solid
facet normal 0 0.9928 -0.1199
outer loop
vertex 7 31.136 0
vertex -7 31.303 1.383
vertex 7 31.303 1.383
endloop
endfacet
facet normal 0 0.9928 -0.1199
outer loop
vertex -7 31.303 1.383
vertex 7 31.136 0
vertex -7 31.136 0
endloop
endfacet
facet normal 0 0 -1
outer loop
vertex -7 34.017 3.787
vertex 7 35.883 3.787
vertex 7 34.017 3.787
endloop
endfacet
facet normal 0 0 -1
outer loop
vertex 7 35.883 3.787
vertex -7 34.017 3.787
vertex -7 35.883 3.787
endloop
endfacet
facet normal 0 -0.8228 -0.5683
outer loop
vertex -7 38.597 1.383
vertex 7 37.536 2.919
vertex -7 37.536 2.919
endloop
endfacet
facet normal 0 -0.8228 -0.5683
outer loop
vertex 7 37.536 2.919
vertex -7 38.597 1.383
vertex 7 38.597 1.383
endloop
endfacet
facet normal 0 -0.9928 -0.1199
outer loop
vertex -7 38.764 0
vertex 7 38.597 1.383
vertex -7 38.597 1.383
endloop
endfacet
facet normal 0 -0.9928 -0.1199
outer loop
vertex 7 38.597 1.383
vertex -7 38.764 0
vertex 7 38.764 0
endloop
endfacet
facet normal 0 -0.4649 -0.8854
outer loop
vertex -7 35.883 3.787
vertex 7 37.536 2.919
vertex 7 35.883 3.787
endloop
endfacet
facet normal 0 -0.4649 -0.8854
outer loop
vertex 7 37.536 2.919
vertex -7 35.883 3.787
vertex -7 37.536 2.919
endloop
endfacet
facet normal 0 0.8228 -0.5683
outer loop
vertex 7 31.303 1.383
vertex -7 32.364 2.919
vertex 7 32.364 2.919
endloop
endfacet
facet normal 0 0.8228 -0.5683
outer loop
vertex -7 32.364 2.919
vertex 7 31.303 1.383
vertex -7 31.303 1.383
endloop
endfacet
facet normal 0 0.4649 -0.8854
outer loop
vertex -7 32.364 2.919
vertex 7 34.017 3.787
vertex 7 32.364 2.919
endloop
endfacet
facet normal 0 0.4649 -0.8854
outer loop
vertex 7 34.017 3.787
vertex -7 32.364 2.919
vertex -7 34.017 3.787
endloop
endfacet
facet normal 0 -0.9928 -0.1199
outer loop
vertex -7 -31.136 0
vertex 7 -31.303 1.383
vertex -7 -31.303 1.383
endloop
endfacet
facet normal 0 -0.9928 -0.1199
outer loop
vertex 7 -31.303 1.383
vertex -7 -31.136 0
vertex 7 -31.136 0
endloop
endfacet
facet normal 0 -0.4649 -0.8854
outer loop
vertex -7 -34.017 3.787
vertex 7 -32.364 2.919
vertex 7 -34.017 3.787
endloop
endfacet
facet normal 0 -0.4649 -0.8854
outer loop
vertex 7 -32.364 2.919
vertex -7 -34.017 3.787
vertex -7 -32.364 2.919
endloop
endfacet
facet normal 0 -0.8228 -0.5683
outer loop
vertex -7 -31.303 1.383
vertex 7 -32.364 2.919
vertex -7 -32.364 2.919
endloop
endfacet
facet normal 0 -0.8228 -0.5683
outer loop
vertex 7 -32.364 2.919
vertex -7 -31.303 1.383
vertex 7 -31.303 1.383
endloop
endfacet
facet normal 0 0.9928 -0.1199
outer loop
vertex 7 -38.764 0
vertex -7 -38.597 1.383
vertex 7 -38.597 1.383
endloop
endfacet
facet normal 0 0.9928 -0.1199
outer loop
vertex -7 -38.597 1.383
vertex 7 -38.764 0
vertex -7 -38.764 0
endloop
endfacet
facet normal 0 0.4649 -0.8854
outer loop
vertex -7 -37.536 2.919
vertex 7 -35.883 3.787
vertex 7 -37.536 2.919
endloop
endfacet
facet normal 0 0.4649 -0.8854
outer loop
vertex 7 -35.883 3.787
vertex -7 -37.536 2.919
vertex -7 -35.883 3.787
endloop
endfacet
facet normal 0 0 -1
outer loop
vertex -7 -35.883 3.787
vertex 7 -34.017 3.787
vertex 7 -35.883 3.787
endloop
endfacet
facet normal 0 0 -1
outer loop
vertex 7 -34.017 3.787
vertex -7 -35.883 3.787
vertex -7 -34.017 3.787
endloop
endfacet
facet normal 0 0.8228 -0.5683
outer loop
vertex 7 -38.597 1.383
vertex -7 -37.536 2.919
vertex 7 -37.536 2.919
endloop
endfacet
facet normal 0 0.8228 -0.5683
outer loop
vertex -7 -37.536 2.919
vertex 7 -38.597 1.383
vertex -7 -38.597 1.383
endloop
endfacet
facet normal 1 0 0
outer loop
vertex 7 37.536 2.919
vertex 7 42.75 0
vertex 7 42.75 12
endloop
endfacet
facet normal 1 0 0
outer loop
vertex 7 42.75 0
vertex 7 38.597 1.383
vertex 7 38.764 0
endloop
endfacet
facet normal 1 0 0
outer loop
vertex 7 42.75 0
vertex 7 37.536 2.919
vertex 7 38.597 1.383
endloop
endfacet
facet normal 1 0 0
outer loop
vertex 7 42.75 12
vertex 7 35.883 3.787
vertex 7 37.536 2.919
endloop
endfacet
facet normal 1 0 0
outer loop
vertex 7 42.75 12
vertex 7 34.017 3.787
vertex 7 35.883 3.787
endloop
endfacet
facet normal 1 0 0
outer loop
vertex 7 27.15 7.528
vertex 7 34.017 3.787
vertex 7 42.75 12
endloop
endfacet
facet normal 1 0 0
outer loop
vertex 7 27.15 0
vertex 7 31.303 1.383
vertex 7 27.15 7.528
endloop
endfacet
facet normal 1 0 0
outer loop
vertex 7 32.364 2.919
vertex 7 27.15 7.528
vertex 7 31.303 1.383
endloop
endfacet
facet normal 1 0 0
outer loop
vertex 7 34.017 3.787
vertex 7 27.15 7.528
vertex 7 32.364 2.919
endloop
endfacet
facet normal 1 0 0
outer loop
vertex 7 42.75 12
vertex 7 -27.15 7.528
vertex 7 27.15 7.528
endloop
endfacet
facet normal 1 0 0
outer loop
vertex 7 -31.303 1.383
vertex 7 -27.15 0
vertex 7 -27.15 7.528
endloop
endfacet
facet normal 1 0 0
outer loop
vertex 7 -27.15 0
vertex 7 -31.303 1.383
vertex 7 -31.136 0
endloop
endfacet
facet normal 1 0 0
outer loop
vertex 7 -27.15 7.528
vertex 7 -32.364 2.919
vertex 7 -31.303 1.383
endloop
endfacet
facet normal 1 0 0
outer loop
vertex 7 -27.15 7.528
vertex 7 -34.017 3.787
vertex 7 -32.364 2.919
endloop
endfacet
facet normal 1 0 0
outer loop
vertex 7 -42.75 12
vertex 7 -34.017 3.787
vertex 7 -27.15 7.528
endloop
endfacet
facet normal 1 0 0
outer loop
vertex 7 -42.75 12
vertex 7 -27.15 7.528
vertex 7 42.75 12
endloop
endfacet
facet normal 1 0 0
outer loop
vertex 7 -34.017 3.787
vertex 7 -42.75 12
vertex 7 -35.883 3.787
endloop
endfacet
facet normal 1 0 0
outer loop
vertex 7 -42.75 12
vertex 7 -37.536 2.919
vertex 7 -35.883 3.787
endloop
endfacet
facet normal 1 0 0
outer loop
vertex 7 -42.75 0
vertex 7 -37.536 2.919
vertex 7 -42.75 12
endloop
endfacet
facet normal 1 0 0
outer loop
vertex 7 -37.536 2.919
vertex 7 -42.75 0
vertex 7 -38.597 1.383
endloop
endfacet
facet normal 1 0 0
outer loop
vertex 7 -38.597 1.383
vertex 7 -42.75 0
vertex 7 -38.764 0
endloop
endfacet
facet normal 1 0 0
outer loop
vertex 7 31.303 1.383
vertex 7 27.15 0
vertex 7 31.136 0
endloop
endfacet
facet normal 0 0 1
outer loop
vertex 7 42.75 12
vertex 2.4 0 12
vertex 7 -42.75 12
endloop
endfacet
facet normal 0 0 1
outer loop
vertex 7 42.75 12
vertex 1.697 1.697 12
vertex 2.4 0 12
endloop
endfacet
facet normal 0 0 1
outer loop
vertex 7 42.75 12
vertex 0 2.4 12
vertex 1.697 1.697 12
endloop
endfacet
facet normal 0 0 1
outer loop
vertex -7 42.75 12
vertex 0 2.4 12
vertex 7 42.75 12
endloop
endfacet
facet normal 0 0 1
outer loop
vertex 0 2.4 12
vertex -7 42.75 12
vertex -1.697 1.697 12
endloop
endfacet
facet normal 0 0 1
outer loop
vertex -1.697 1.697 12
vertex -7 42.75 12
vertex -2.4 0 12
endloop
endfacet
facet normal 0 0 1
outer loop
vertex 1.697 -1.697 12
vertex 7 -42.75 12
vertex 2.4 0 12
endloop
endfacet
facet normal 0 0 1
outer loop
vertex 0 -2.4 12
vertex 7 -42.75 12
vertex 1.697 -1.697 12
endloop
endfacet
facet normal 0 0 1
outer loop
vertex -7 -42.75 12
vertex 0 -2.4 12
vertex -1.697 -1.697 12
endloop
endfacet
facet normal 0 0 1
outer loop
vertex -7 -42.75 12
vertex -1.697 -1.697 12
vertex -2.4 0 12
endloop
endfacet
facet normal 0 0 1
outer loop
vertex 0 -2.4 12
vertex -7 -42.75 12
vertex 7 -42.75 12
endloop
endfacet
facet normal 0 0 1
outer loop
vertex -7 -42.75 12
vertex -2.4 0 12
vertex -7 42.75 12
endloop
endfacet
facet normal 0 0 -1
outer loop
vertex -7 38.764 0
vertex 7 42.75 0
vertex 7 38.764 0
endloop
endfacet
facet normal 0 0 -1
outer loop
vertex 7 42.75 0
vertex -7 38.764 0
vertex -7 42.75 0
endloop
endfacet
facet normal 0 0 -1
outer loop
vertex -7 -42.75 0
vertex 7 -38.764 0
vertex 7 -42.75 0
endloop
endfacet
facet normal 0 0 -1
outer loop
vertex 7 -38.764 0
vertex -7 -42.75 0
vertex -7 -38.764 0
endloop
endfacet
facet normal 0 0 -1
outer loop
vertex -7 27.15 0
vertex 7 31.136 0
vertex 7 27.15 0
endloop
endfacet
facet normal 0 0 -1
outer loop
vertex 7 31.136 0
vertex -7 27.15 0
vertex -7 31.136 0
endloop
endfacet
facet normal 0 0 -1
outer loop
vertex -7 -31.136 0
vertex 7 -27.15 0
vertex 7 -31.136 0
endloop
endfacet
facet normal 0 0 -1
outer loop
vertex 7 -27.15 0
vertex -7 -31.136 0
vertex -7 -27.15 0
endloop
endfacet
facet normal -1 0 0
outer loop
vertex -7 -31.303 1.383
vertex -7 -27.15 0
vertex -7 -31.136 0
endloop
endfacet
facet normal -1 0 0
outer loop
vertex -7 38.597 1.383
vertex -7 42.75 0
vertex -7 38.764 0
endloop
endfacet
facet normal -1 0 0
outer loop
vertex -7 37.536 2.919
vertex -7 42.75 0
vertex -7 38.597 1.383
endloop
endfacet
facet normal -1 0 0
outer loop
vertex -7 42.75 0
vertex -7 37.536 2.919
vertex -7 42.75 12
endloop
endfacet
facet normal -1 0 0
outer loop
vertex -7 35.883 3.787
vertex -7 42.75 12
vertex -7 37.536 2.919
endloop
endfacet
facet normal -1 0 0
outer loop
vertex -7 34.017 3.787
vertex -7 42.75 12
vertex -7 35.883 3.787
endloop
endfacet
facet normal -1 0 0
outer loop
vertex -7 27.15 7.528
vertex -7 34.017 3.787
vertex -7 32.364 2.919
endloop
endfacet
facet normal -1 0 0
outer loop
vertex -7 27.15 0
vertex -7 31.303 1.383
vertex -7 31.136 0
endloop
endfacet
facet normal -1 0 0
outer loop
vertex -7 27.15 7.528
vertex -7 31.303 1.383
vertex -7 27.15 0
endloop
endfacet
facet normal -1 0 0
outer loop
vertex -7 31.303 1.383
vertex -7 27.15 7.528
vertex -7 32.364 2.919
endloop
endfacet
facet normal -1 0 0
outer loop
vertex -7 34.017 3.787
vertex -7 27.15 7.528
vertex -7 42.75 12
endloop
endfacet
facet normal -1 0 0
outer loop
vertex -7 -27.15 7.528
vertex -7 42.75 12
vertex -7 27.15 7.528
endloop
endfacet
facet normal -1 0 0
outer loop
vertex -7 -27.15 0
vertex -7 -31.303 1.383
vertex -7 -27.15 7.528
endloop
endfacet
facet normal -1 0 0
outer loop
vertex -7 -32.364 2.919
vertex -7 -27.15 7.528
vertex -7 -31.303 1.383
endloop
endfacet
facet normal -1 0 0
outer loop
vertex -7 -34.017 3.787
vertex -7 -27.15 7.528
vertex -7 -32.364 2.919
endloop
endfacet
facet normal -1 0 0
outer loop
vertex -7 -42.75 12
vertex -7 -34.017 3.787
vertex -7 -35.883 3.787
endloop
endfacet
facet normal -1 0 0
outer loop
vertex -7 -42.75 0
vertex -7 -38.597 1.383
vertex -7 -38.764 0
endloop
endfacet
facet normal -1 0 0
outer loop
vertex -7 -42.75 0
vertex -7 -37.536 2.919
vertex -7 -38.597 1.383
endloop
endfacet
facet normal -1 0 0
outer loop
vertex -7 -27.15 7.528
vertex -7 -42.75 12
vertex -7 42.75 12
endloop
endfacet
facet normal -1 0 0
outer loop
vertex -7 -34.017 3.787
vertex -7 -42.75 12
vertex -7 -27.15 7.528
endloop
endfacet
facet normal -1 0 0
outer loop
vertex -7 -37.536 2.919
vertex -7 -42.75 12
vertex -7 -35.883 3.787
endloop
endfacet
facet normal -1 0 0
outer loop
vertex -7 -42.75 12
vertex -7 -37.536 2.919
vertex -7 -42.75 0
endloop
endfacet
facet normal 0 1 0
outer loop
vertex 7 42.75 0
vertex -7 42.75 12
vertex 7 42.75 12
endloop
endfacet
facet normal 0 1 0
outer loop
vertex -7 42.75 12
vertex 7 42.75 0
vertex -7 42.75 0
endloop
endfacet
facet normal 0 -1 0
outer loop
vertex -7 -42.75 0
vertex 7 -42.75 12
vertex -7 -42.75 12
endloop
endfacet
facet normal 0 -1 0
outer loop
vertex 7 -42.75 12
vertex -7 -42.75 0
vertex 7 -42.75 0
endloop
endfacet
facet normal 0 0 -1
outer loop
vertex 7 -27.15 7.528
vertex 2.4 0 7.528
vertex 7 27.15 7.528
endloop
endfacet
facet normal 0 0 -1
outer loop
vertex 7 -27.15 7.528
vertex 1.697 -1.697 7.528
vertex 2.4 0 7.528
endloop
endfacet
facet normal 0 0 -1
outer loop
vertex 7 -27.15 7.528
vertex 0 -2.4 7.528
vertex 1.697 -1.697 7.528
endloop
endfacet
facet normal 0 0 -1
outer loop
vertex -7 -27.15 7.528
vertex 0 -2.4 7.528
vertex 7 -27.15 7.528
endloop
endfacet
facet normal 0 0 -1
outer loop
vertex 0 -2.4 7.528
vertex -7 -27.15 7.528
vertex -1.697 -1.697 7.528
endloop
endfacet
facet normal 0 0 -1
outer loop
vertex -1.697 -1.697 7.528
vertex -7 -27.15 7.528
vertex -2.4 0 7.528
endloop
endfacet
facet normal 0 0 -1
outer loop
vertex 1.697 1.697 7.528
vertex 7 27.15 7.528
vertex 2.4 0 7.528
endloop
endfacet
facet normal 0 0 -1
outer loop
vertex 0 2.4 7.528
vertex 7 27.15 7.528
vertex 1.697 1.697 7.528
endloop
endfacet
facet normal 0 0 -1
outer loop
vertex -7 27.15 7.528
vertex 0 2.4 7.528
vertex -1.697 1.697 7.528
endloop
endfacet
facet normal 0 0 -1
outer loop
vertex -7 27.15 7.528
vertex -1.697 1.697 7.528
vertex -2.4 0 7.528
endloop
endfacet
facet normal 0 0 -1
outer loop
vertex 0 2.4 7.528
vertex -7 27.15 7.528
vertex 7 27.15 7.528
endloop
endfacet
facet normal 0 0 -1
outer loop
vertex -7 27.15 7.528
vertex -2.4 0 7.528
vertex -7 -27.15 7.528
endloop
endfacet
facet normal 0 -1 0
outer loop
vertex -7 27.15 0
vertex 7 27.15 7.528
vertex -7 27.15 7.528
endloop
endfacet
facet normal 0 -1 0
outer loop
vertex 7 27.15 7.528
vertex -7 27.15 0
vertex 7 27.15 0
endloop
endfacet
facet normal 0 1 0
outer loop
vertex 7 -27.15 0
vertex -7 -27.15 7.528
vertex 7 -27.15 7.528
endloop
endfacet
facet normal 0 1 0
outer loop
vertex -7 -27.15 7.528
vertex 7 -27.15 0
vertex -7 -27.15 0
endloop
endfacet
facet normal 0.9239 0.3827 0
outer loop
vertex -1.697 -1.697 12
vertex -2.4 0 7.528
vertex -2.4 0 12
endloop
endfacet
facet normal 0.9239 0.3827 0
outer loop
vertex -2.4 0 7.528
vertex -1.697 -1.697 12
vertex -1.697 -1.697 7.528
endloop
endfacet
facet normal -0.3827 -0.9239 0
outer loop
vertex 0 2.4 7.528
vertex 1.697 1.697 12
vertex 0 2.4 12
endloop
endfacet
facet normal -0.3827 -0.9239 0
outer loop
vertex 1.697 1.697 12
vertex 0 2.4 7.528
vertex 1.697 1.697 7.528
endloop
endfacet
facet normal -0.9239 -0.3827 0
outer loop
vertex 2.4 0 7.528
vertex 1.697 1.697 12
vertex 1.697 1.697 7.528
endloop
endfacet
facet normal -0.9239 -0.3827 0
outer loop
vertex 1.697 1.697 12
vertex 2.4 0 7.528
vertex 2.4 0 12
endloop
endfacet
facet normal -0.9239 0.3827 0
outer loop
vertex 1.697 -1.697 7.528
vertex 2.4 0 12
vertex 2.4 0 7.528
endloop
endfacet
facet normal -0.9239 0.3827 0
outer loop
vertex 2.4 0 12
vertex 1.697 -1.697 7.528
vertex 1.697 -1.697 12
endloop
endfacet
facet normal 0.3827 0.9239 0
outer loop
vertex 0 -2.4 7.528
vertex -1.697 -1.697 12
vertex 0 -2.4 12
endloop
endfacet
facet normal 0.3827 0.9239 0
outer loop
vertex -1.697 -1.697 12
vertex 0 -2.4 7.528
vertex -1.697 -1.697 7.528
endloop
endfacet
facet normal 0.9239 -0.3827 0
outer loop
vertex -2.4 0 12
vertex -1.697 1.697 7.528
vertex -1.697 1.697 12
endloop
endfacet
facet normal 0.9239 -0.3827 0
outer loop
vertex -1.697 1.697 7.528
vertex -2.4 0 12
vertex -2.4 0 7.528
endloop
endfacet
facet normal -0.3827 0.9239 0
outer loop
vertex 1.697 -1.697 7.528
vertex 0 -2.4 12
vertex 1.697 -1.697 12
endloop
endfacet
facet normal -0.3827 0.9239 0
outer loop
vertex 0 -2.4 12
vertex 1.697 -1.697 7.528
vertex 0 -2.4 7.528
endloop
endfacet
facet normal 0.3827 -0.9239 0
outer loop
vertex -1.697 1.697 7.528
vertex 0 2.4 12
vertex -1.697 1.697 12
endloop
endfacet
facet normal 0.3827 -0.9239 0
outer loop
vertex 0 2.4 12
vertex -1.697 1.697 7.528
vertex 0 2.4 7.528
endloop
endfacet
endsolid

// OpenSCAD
//Stand for Depth Guage
//Ari M. Diacou
//Created Jan 16, 2016
//Shared under Creative Commons License: Attribution-ShareAlike 3.0 Unported (CC BY-SA 3.0) 
//see http://creativecommons.org/licenses/by-sa/3.0/


//Measure the widest part of the base of your depth guage.
depth_guage_width = 52.8;
//Measure the base of your depth guage in a direction perpendicular to the distance measured above.
depth_guage_length = 7;
//How much could the depth guage be recessed into the block (and still lie flat)?
depth_guage_depth = 4.2;
//By what height does the bridge have to clear the belt above the top of the rails?
clearance=3.4;
//How high should this block be?
block_height = 12;
//What is the diameter of your depth guage pin (plus a tolerance)?
hole_diameter = 4.8;
//Measure the distance between your rails.
inner_rail_distance = 62.1;
//Measure the distance between the outsides of your rails.
outer_rail_distance = 77.7;

// preview[view:south east, tilt:top]

/* [Hidden] */
//////////////// Derived Parameters ////////////////////////
rail_diameter=(outer_rail_distance-inner_rail_distance)/2;
ep=0+0.05; //epsilon, a small number, used for overlaps
block=[depth_guage_length*2, outer_rail_distance+rail_diameter, block_height];
inner_height=rms([block_height,clearance+depth_guage_depth+rail_diameter/2,clearance+depth_guage_length/2+rail_diameter/2])-rms([depth_guage_length/2,depth_guage_depth]);
//Tries to make an estimate of the thickenss of the "bridge". Should be thick enough that the bridge will not bend while taking readings.
echo(str("block height = ",block_height));
echo(str("inner height = ",inner_height));


cutout=[block[0]+2*ep,inner_rail_distance-rail_diameter,inner_height];

////////////////////// Main() /////////////////////////////
type1();
//////////////////// Functions ////////////////////////////
function rms(list)=norm(list)/sqrt(len(list));
module centered_cube(block){
    translate(-0.5*block+[0,0,.5*block[2]])
        cube(block);
    }
module type1(){
    difference(){
        outer();
        rails();
        inner();
        hole();
        }
    }
module outer(){
    centered_cube(block);
    }
    
module inner(){
    translate([0,0,-ep])
        centered_cube(cutout);
    }

module rails(){
    dist=[0,inner_rail_distance/2+rail_diameter/2,0];
    rotate([0,90,0])
        translate(dist)
            cylinder(d=rail_diameter,h=block[0]+ep, center=true);
    rotate([0,90,0])
        translate(-dist)
            cylinder(d=rail_diameter,h=block[0]+ep, center=true);
    }
module hole(){
    cylinder(h=block[2]+ep,d=hole_diameter);
    }
module recess(){
    
    }
